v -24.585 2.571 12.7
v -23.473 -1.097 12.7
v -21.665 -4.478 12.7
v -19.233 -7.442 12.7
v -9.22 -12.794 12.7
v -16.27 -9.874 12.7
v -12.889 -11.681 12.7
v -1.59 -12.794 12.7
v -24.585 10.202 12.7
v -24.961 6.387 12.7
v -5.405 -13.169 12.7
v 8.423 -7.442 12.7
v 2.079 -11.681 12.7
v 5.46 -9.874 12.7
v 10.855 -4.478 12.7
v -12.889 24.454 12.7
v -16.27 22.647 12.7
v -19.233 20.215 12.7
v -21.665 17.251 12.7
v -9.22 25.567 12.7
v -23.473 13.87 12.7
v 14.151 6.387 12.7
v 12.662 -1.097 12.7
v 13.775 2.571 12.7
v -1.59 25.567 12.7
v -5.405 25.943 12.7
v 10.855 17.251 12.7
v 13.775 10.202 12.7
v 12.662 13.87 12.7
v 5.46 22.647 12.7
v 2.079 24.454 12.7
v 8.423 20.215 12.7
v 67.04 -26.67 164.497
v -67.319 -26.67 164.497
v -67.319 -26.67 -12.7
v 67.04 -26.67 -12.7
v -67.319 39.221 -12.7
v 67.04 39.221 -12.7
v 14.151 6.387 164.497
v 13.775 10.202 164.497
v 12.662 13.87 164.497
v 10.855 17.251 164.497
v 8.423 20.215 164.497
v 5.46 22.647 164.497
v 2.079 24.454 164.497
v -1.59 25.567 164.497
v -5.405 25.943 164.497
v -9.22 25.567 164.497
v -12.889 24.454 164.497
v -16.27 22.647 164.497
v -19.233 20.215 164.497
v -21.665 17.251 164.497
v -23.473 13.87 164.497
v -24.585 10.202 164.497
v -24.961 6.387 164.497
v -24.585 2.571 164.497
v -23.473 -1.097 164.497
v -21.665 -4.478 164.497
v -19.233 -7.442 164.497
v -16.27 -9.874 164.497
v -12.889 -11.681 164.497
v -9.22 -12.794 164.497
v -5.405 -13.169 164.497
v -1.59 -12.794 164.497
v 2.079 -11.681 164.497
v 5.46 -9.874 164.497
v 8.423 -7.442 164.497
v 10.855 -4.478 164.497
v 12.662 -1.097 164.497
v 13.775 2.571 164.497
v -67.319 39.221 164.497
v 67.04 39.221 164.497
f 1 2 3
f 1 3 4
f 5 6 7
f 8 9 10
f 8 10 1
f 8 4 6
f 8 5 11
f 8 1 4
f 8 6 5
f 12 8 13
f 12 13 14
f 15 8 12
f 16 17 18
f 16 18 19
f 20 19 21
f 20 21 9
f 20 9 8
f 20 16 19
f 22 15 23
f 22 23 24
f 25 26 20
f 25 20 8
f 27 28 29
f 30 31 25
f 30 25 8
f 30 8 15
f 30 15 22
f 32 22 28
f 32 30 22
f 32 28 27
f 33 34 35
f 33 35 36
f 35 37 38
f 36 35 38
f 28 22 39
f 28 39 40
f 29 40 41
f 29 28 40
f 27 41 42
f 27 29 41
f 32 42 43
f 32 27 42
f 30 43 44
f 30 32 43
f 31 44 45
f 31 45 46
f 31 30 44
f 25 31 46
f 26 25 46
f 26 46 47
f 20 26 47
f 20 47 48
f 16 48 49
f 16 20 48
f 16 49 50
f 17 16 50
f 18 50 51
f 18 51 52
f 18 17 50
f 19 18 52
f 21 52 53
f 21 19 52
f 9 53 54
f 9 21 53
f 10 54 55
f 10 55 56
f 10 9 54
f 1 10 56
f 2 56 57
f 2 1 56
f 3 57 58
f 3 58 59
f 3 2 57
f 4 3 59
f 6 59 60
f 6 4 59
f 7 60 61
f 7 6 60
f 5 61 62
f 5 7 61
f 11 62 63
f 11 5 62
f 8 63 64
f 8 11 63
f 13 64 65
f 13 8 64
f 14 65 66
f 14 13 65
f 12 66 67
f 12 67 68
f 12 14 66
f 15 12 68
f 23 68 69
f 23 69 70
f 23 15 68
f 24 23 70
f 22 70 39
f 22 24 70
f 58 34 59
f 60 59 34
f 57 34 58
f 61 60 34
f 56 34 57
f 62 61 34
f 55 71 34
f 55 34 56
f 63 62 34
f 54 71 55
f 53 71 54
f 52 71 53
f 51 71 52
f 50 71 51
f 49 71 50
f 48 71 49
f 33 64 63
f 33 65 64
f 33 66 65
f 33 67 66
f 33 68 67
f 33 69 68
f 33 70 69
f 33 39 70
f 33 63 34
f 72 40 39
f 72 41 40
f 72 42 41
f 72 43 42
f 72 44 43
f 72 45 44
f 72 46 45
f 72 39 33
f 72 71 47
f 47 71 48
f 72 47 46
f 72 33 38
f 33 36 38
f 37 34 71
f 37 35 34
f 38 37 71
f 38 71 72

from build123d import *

# Parameters (mm, degrees)
F0_W     = 134.359292686
F0_H     = 65.8905915916
F1_DEPTH = 12.7
F2_W     = 134.359292686
F2_H     = 65.8905915916
F2_R     = 19.5560536298
F3_DEPTH = 151.7965264


# Not quite as in the source:
# - an extrude ends at something that could not be found from the text; its depth is read off the source's solid


with BuildPart() as f1:
    # F0 (on Top) → F1 (new body, symmetric)
    with BuildSketch(Plane.XY):
        with Locations((-0.1394487917, 6.2752943486)):
            Rectangle(F0_W, F0_H)
    extrude(amount=F1_DEPTH, both=True)

    # F2 (on face) → F3 (join, through all)
    with BuildSketch(Plane.XY.offset(12.7)):
        with Locations((-0.1394487917, 6.2752943486)):
            Rectangle(F2_W, F2_H)
        with Locations((-5.4052090272, 6.3866404817)):
            Circle(F2_R, mode=Mode.SUBTRACT)
    extrude(amount=F3_DEPTH)


solid = f1.part
